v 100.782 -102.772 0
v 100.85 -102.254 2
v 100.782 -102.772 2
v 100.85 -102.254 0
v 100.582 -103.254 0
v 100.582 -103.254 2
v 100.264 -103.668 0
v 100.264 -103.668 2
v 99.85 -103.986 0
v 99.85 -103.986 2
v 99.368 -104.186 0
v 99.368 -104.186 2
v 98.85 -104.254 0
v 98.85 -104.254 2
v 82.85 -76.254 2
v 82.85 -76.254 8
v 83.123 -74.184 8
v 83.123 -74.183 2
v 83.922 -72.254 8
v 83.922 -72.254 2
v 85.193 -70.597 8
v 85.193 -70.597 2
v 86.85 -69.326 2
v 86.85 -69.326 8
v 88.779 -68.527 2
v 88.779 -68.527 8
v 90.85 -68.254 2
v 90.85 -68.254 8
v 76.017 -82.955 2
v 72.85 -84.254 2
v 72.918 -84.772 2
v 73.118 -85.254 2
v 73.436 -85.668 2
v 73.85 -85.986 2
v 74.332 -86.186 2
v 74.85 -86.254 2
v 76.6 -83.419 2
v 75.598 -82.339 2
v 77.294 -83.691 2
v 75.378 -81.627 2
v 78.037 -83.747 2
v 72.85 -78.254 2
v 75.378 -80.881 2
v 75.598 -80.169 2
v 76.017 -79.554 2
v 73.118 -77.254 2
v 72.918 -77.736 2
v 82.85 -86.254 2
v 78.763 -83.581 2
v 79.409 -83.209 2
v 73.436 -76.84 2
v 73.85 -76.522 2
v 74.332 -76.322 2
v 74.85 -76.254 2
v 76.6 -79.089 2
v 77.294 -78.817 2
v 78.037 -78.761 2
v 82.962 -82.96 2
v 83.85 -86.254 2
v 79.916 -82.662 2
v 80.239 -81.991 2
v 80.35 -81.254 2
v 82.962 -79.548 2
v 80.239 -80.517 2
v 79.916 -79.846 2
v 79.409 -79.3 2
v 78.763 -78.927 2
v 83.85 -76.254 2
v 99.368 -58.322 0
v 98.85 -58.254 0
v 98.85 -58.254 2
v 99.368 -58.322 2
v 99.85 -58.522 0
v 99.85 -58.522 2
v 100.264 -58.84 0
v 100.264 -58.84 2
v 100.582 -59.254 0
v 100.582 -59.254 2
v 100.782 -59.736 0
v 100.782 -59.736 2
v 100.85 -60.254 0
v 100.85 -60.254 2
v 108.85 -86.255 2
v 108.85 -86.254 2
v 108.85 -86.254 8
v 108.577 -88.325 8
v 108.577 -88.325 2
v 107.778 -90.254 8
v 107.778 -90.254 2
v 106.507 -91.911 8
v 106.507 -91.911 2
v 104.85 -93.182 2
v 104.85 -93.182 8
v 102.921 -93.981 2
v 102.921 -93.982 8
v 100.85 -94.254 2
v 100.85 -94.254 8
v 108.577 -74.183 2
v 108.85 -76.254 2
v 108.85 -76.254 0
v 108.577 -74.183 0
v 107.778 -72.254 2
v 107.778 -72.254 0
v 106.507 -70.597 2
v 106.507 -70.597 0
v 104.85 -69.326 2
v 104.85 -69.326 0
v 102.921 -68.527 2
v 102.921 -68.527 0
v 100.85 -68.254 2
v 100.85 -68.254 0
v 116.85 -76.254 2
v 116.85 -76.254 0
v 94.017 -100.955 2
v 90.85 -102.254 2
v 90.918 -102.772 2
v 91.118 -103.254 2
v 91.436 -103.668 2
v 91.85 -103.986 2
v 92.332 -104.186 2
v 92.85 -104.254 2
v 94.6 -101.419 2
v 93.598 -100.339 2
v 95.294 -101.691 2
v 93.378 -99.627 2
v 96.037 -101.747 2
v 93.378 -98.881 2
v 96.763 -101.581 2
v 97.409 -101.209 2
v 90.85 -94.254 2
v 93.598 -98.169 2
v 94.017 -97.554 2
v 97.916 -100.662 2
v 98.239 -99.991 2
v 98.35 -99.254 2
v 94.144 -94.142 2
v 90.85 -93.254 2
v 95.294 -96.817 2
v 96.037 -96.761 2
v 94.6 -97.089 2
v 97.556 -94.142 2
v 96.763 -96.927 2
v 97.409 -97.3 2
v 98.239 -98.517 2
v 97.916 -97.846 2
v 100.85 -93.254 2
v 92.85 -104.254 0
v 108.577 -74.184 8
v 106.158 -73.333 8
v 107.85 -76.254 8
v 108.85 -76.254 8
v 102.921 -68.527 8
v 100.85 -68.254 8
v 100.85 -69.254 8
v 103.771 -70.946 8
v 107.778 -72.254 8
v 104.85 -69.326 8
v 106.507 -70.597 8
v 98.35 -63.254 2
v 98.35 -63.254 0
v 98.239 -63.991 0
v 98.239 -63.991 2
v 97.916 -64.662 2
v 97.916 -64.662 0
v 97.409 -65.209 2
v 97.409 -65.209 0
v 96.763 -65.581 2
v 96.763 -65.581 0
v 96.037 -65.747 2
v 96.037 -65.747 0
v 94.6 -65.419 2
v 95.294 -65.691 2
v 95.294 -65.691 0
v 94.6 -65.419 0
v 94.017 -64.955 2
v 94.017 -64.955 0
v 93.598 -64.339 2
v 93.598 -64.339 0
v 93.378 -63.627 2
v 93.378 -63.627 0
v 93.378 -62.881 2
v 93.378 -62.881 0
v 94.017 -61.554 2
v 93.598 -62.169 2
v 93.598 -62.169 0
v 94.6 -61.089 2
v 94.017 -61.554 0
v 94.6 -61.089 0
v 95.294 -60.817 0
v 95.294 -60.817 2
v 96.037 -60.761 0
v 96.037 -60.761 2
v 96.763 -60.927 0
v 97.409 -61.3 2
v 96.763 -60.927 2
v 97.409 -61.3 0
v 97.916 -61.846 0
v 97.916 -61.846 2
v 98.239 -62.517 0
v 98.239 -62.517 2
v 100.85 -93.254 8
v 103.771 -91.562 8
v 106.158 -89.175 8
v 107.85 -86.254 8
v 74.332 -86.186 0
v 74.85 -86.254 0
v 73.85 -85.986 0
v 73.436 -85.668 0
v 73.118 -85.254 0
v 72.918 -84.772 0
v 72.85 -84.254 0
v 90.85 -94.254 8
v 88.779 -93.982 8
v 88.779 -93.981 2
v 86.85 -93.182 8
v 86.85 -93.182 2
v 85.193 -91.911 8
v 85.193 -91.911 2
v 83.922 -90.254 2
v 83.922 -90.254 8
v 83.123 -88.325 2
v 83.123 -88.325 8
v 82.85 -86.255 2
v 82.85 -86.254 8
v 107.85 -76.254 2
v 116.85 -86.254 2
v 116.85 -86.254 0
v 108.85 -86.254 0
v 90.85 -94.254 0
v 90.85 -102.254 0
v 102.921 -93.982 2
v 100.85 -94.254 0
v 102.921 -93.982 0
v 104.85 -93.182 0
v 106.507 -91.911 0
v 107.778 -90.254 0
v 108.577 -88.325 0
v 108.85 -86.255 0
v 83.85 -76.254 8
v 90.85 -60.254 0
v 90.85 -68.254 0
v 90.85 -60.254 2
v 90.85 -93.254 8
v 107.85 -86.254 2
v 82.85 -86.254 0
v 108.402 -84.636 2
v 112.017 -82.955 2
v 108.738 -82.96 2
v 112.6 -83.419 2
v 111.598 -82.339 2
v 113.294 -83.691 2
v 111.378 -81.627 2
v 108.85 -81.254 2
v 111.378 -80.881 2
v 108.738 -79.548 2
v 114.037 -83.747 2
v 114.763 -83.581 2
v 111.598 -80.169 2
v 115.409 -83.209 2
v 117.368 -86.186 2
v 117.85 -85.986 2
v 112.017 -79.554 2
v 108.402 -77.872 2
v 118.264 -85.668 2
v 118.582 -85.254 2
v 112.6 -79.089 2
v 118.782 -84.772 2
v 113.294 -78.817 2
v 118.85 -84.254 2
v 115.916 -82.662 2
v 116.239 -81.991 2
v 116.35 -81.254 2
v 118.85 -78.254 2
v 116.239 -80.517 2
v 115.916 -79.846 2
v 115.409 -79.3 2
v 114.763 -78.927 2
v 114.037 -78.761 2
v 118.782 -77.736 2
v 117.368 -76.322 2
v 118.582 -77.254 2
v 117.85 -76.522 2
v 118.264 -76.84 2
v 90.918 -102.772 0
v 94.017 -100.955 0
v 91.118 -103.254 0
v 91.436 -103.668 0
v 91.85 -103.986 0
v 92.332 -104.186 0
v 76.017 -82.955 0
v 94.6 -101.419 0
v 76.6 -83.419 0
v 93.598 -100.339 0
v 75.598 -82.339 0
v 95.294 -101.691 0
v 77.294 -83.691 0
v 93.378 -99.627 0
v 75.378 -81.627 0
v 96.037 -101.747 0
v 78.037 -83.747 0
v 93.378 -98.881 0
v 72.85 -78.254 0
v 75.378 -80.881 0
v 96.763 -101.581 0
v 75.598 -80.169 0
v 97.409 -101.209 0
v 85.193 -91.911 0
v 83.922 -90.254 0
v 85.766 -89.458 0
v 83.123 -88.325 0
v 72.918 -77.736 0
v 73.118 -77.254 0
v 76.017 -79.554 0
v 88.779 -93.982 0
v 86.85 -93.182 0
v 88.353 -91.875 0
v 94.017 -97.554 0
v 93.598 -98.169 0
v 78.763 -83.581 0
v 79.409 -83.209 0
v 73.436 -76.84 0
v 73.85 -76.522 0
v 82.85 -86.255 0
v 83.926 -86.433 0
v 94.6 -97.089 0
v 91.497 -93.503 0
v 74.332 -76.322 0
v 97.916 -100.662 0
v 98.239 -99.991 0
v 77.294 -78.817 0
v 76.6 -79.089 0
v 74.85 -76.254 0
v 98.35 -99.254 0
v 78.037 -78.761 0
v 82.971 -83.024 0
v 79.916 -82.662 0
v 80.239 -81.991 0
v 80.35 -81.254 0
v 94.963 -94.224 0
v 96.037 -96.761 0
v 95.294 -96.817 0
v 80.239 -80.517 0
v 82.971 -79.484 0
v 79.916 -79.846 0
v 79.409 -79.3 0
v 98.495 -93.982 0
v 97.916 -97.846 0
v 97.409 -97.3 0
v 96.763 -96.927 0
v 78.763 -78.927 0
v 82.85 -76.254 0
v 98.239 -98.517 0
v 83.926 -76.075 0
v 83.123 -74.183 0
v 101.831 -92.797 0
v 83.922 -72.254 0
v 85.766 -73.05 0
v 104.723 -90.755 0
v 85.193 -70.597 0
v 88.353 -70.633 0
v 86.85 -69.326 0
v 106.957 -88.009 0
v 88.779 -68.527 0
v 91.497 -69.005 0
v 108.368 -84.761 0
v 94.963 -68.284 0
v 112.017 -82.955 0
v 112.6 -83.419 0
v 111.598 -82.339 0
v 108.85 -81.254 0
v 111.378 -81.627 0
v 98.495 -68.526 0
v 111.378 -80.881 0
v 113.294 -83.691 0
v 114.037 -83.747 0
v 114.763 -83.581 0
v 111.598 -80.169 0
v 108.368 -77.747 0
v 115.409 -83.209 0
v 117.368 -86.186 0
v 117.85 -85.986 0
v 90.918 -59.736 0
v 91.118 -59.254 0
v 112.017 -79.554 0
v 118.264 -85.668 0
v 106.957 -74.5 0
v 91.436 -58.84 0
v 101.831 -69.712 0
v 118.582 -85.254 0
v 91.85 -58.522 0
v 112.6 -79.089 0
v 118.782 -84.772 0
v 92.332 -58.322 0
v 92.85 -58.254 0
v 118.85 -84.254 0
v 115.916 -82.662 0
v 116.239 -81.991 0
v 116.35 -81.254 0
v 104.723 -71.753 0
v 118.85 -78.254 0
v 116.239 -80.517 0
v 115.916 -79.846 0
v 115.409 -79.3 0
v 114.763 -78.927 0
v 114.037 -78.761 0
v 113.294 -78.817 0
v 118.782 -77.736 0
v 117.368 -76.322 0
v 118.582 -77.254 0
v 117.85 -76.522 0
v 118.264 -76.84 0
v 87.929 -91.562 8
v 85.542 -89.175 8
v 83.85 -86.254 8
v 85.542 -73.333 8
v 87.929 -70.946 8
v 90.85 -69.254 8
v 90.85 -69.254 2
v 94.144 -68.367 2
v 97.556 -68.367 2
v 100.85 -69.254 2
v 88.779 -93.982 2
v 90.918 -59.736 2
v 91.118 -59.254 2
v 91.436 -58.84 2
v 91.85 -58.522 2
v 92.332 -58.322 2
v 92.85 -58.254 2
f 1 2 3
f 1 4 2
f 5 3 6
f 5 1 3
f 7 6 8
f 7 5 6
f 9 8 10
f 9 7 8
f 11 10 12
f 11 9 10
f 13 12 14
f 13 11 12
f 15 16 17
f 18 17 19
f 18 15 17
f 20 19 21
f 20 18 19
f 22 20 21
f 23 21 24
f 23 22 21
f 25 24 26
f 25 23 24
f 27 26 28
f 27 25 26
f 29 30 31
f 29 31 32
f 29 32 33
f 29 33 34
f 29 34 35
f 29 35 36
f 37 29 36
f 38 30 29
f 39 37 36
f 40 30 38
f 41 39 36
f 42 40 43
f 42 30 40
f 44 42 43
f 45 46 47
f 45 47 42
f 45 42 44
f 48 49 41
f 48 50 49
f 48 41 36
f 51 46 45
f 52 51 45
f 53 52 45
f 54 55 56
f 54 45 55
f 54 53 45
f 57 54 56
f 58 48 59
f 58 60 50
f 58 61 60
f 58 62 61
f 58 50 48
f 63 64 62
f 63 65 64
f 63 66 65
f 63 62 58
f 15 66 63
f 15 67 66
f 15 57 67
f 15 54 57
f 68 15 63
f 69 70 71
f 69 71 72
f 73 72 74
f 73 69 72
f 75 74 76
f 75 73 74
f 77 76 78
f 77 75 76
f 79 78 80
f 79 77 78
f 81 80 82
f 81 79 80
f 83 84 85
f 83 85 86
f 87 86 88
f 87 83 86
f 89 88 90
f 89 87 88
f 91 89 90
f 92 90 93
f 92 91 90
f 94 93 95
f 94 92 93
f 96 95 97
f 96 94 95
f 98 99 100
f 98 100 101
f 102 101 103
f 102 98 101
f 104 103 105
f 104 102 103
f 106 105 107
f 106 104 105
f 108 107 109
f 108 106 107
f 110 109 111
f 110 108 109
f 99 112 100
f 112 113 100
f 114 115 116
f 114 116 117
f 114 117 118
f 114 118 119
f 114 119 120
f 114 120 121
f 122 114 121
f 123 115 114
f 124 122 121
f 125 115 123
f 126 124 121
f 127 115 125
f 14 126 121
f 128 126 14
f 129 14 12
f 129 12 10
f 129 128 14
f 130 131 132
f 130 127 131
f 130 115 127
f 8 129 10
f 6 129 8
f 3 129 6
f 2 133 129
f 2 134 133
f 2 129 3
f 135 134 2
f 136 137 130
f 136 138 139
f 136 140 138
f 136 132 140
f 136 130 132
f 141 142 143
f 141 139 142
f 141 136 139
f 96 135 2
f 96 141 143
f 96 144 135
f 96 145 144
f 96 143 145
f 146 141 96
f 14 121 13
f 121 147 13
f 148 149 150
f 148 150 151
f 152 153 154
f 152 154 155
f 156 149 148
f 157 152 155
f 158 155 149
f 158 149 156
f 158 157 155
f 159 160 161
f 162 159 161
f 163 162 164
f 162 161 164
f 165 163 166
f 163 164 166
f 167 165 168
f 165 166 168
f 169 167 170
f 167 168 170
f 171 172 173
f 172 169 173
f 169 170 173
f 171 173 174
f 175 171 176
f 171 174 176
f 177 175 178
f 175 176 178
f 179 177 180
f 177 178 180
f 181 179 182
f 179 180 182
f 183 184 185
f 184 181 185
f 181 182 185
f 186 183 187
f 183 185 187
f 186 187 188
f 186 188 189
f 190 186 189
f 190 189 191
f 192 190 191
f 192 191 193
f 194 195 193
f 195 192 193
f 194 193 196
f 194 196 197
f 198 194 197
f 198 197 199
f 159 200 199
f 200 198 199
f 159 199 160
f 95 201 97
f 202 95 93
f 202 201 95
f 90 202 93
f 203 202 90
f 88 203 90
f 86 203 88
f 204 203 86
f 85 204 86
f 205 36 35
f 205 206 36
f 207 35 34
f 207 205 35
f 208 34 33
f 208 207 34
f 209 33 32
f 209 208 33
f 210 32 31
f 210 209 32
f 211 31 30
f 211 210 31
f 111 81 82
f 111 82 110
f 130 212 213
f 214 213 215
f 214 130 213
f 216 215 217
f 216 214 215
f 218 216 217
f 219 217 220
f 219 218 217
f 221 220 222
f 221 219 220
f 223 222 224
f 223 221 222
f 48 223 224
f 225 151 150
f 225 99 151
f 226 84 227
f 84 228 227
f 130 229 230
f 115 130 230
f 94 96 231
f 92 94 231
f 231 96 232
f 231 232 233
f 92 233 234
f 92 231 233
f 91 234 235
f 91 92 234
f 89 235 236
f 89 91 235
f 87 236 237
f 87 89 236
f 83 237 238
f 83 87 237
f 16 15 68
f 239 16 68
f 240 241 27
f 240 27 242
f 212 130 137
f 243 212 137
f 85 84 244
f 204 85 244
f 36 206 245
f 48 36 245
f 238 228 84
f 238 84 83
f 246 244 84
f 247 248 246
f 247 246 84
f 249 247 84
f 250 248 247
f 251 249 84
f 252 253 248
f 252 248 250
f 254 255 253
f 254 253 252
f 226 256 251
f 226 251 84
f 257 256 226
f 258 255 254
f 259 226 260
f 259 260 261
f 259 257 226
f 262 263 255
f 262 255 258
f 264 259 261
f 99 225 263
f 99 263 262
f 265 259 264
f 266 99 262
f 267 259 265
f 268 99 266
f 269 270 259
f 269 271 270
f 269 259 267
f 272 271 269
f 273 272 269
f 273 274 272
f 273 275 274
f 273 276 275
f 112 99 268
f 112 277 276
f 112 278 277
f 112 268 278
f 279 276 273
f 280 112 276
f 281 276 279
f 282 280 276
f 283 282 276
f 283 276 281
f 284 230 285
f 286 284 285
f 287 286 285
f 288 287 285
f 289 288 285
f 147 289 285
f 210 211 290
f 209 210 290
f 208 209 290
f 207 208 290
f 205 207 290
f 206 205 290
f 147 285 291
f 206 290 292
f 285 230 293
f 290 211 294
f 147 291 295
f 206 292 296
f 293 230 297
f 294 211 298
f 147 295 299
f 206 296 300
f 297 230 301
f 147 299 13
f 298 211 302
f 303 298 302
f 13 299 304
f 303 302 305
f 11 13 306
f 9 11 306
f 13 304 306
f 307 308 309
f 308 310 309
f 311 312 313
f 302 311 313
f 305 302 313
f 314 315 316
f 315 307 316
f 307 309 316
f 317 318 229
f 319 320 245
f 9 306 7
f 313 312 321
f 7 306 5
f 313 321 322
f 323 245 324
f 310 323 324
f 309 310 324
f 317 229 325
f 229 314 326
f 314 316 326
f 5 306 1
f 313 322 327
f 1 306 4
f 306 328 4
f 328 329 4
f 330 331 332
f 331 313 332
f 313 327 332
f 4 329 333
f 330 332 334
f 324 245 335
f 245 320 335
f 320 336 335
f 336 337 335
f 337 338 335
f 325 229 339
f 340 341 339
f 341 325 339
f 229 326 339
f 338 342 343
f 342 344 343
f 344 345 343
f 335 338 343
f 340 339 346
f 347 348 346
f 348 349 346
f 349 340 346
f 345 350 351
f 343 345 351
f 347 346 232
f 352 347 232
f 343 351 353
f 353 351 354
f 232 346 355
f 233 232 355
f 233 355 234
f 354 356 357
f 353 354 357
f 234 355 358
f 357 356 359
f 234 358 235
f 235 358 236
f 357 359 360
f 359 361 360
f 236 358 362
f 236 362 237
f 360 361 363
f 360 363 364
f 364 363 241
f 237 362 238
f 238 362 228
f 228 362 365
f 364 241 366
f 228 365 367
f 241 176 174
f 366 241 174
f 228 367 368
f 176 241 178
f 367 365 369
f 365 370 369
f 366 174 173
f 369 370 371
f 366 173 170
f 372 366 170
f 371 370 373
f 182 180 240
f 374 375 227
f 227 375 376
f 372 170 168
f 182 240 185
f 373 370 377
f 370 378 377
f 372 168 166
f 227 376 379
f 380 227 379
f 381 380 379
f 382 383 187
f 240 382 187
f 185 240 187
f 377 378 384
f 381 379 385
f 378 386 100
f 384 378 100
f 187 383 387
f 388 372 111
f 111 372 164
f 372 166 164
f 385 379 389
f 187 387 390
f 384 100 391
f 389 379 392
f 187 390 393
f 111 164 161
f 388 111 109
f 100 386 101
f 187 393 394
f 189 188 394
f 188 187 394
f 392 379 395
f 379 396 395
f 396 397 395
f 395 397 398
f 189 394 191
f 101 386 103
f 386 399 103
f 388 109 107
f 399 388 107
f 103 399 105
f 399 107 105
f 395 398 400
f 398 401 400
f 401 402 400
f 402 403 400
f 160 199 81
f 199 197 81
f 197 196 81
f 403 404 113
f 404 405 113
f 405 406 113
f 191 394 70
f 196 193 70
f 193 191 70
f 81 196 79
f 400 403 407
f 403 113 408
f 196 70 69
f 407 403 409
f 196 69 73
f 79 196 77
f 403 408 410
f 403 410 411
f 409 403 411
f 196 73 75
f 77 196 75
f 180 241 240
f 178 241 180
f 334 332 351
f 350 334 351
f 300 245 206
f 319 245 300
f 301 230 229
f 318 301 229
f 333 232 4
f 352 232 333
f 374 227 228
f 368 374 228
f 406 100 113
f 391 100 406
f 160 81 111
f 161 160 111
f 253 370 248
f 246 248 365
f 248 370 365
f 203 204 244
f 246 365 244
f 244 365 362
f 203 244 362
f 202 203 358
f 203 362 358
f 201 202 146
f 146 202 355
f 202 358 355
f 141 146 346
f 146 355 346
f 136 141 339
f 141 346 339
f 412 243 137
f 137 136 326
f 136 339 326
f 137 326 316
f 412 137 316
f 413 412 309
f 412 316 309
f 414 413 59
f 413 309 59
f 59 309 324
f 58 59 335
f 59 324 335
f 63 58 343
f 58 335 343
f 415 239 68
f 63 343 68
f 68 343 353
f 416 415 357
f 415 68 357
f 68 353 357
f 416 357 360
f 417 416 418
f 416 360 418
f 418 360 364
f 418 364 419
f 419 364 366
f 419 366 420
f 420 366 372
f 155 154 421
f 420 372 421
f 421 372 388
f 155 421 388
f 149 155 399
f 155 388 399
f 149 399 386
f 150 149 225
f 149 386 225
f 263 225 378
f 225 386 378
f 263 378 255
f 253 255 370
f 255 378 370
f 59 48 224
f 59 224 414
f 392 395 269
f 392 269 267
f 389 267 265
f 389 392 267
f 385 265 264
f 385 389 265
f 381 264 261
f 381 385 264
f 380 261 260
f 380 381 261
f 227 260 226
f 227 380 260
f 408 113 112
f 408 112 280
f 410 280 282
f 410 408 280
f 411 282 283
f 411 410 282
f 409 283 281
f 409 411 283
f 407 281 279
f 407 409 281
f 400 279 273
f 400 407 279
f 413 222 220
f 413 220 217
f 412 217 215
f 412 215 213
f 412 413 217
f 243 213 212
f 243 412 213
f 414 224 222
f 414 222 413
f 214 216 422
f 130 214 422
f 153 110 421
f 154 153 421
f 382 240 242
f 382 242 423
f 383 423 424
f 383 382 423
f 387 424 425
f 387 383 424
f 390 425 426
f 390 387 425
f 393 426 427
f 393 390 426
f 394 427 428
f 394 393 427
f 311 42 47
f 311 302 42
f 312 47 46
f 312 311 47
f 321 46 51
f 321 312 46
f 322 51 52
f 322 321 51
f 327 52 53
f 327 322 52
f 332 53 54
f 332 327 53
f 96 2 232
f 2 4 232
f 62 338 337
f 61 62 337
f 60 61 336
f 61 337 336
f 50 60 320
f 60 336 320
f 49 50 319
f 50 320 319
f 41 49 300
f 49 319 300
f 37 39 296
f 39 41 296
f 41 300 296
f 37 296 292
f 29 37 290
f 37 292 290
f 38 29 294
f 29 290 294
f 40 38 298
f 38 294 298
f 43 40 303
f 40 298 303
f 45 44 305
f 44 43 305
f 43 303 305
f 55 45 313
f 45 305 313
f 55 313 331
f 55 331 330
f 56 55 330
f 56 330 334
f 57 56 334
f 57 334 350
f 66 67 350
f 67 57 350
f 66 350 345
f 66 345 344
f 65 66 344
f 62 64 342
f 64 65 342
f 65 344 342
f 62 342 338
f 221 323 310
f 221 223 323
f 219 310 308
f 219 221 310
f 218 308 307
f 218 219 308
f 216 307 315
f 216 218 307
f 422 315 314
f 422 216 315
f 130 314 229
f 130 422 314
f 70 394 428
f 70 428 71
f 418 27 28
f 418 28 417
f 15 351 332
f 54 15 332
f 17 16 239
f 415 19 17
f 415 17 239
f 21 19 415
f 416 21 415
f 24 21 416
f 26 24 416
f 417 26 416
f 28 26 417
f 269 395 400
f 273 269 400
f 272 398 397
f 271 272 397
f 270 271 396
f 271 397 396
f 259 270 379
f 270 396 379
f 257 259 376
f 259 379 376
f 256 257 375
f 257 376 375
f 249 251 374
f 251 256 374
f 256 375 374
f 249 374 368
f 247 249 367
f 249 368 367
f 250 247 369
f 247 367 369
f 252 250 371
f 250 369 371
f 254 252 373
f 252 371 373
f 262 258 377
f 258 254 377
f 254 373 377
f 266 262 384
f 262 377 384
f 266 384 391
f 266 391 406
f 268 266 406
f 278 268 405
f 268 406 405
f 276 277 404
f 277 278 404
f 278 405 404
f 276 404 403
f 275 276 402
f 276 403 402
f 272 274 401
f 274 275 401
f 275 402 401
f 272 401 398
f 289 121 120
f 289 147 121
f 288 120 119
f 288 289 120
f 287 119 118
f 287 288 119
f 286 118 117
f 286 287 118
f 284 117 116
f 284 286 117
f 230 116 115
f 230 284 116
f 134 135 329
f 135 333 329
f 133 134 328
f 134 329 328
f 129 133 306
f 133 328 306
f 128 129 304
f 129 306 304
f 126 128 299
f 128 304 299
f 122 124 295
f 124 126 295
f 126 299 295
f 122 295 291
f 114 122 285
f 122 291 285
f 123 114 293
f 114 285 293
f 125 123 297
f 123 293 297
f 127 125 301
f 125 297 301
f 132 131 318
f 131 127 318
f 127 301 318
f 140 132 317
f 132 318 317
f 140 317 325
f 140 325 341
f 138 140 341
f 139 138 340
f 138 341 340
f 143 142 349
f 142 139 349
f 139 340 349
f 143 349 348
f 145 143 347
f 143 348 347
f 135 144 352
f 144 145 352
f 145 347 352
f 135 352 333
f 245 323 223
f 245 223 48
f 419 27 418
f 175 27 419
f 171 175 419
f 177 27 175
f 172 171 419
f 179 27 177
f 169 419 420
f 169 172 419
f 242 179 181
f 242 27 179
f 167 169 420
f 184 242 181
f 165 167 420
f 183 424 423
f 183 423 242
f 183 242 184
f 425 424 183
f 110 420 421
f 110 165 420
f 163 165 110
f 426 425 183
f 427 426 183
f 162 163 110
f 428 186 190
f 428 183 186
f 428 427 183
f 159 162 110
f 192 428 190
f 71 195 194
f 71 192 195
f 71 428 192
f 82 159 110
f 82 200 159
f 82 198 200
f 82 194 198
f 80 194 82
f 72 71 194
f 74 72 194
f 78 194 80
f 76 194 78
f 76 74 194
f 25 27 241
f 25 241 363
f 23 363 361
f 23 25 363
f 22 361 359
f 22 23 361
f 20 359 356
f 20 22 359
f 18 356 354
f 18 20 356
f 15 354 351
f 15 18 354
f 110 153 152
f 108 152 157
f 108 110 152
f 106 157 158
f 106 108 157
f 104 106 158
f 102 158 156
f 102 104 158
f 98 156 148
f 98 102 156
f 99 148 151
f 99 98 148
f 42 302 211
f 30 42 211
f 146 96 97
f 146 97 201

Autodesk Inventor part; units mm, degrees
ref_plane "YZ Plane" through (0, 0, 0) normal (1, 0, 0) x (0, 1, 0)
sketch "Sketch1" plane through (0, 0, 0) normal (0, 0, 1) x (1, 0, 0)
  circle A0 centre (95.85, -81.2541) radius 13 projected
  line L0 (108.85, -68.2541) -> (108.85, -94.2541)
  line L1 (82.85, -94.2541) -> (82.85, -68.2541)
  line L2 (82.85, -68.2541) -> (108.85, -68.2541)
  line L3 (82.85, -81.2541) -> (77.85, -81.2541) construction
  line L4 (95.85, -68.2541) -> (95.85, -63.2541) construction
  line L5 (108.85, -81.2541) -> (113.85, -81.2541) construction
  line L6 (108.85, -81.2541) -> (113.85, -81.2541) construction
  line L7 (95.85, -94.2541) -> (95.85, -99.2541) construction
  line L8 (92.85, -58.2541) -> (98.85, -58.2541)
  line L9 (100.85, -60.2541) -> (100.85, -68.2541)
  line L10 (100.85, -68.2541) -> (90.85, -68.2541)
  line L11 (90.85, -68.2541) -> (90.85, -60.2541)
  line L12 (90.85, -58.2541) -> (100.85, -68.2541) construction
  line L13 (100.85, -58.2541) -> (90.85, -68.2541) construction
  line L14 (116.85, -76.2541) -> (108.85, -76.2541)
  line L15 (108.85, -76.2541) -> (108.85, -86.2541)
  line L16 (108.85, -86.2541) -> (116.85, -86.2541)
  line L17 (118.85, -84.2541) -> (118.85, -78.2541)
  line L18 (118.85, -76.2541) -> (108.85, -86.2541) construction
  line L19 (108.85, -76.2541) -> (118.85, -86.2541) construction
  line L20 (92.85, -104.2541) -> (98.85, -104.2541)
  line L21 (100.85, -102.2541) -> (100.85, -94.2541)
  line L22 (95.85, -94.2541) -> (90.85, -94.2541)
  line L23 (90.85, -94.2541) -> (90.85, -102.2541)
  line L24 (90.85, -104.2541) -> (100.85, -94.2541) construction
  line L25 (100.85, -104.2541) -> (90.85, -94.2541) construction
  line L26 (74.85, -86.2541) -> (82.85, -86.2541)
  line L27 (82.85, -86.2541) -> (82.85, -76.2541)
  line L28 (82.85, -76.2541) -> (74.85, -76.2541)
  line L29 (72.85, -78.2541) -> (72.85, -84.2541)
  line L30 (72.85, -86.2541) -> (82.85, -76.2541) construction
  line L31 (82.85, -86.2541) -> (72.85, -76.2541) construction
  circle A1 centre (77.85, -81.2541) radius 2.5
  circle A2 centre (95.85, -63.2541) radius 2.5
  circle A3 centre (113.85, -81.2541) radius 2.5
  circle A4 centre (95.85, -99.2541) radius 2.5
  line L32 (108.85, -94.2541) -> (95.85, -94.2541)
  line L33 (90.85, -94.2541) -> (82.85, -94.2541)
  arc A5 (92.85, -58.2541) -> (90.85, -60.2541) centre (92.85, -60.2541) ccw
  arc A6 (100.85, -60.2541) -> (98.85, -58.2541) centre (98.85, -60.2541) ccw
  arc A7 (118.85, -78.2541) -> (116.85, -76.2541) centre (116.85, -78.2541) ccw
  arc A8 (116.85, -86.2541) -> (118.85, -84.2541) centre (116.85, -84.2541) ccw
  arc A9 (98.85, -104.2541) -> (100.85, -102.2541) centre (98.85, -102.2541) ccw
  arc A10 (90.85, -102.2541) -> (92.85, -104.2541) centre (92.85, -102.2541) ccw
  arc A11 (72.85, -84.2541) -> (74.85, -86.2541) centre (74.85, -84.2541) ccw
  arc A12 (74.85, -76.2541) -> (72.85, -78.2541) centre (74.85, -78.2541) ccw
  point P0 (0, 0)
  dimension "d0" = 5
  dimension "d1" = 5
  dimension "d2" = 5
  dimension "d3" = 0
  dimension "d4" = 5
  dimension "d5" = 10
  dimension "d6" = 5
  dimension "d7" = 5
  dimension "d8" = 5
  dimension "d9" = 5
  dimension "d10" = 2
ref_plane "Work Plane1" through (82.85, -94.2541, 8) normal (0, 0, 1) x (1, 0, 0)
extrude "Extrusion1" add sketch "Sketch1" along normal blind 2 contours L22 L33 L1 A0 | L32 L21 A9 L20 A10 L23 L22 | A0 L0 L32 | A0 L2 L0 | L0 L14 A7 L17 A8 L16 | L1 L2 A0 | L1 L26 A11 L29 A12 L28 | L2 L11 A5 L8 A6 L9
fillet "Fillet1" radius 8 4 edges at (108.85, -68.2541, 1) (82.85, -68.2541, 1) (82.85, -94.2541, 1) (108.85, -94.2541, 1)
sketch "Sketch2" plane through (0, 0, 2) normal (0, 0, 1) x (1, 0, 0)
  arc A0 (100.85, -94.2541) -> (108.85, -86.2541) centre (100.85, -86.2541) ccw projected
  line L0 (108.85, -86.2541) -> (116.85, -86.2541) projected
  arc A1 (116.85, -86.2541) -> (118.85, -84.2541) centre (116.85, -84.2541) ccw projected
  line L1 (118.85, -84.2541) -> (118.85, -78.2541) projected
  arc A2 (118.85, -78.2541) -> (116.85, -76.2541) centre (116.85, -78.2541) ccw projected
  line L2 (116.85, -76.2541) -> (108.85, -76.2541) projected
  arc A3 (108.85, -76.2541) -> (100.85, -68.2541) centre (100.85, -76.2541) ccw projected
  line L3 (100.85, -68.2541) -> (100.85, -60.2541) projected
  arc A4 (100.85, -60.2541) -> (98.85, -58.2541) centre (98.85, -60.2541) ccw projected
  line L4 (98.85, -58.2541) -> (92.85, -58.2541) projected
  arc A5 (92.85, -58.2541) -> (90.85, -60.2541) centre (92.85, -60.2541) ccw projected
  line L5 (90.85, -60.2541) -> (90.85, -68.2541) projected
  arc A6 (90.85, -68.2541) -> (82.85, -76.2541) centre (90.85, -76.2541) ccw projected
  line L6 (82.85, -76.2541) -> (74.85, -76.2541) projected
  arc A7 (74.85, -76.2541) -> (72.85, -78.2541) centre (74.85, -78.2541) ccw projected
  line L7 (72.85, -78.2541) -> (72.85, -84.2541) projected
  arc A8 (72.85, -84.2541) -> (74.85, -86.2541) centre (74.85, -84.2541) ccw projected
  line L8 (74.85, -86.2541) -> (82.85, -86.2541) projected
  arc A9 (82.85, -86.2541) -> (90.85, -94.2541) centre (90.85, -86.2541) ccw projected
  line L9 (90.85, -94.2541) -> (90.85, -102.2541) projected
  arc A10 (90.85, -102.2541) -> (92.85, -104.2541) centre (92.85, -102.2541) ccw projected
  line L10 (92.85, -104.2541) -> (98.85, -104.2541) projected
  arc A11 (98.85, -104.2541) -> (100.85, -102.2541) centre (98.85, -102.2541) ccw projected
  line L11 (100.85, -102.2541) -> (100.85, -94.2541) projected
  circle A12 centre (95.85, -99.2541) radius 2.5 projected
  circle A13 centre (113.85, -81.2541) radius 2.5 projected
  circle A14 centre (95.85, -63.2541) radius 2.5 projected
  circle A15 centre (77.85, -81.2541) radius 2.5 projected
  circle A16 centre (95.85, -81.2541) radius 13 projected
  line L12 (90.85, -68.2541) -> (90.85, -69.2541)
  line L13 (100.85, -68.2541) -> (100.85, -69.2541)
  line L14 (108.85, -76.2541) -> (107.85, -76.2541)
  line L15 (108.85, -86.2541) -> (107.85, -86.2541)
  line L16 (100.85, -94.2541) -> (100.85, -93.2541)
  line L17 (90.85, -94.2541) -> (90.85, -93.2541)
  line L18 (82.85, -86.2541) -> (83.85, -86.2541)
  line L19 (82.85, -76.2541) -> (83.85, -76.2541)
  circle A17 centre (95.85, -81.2541) radius 13 projected
  point P0 (0, 0)
ref_plane "Work Plane2" through (82.85, -94.2541, 8) normal (0, 0, 1) x (1, 0, 0)
extrude "Extrusion2" add sketch "Sketch2" along normal up to surface (6 mm away) contours L16 A16 L15 A0 | L17 A9 L18 A16 | A16 L13 A3 L14 | L19 A6 L12 A16
properties part number "BearingMountMK2"
